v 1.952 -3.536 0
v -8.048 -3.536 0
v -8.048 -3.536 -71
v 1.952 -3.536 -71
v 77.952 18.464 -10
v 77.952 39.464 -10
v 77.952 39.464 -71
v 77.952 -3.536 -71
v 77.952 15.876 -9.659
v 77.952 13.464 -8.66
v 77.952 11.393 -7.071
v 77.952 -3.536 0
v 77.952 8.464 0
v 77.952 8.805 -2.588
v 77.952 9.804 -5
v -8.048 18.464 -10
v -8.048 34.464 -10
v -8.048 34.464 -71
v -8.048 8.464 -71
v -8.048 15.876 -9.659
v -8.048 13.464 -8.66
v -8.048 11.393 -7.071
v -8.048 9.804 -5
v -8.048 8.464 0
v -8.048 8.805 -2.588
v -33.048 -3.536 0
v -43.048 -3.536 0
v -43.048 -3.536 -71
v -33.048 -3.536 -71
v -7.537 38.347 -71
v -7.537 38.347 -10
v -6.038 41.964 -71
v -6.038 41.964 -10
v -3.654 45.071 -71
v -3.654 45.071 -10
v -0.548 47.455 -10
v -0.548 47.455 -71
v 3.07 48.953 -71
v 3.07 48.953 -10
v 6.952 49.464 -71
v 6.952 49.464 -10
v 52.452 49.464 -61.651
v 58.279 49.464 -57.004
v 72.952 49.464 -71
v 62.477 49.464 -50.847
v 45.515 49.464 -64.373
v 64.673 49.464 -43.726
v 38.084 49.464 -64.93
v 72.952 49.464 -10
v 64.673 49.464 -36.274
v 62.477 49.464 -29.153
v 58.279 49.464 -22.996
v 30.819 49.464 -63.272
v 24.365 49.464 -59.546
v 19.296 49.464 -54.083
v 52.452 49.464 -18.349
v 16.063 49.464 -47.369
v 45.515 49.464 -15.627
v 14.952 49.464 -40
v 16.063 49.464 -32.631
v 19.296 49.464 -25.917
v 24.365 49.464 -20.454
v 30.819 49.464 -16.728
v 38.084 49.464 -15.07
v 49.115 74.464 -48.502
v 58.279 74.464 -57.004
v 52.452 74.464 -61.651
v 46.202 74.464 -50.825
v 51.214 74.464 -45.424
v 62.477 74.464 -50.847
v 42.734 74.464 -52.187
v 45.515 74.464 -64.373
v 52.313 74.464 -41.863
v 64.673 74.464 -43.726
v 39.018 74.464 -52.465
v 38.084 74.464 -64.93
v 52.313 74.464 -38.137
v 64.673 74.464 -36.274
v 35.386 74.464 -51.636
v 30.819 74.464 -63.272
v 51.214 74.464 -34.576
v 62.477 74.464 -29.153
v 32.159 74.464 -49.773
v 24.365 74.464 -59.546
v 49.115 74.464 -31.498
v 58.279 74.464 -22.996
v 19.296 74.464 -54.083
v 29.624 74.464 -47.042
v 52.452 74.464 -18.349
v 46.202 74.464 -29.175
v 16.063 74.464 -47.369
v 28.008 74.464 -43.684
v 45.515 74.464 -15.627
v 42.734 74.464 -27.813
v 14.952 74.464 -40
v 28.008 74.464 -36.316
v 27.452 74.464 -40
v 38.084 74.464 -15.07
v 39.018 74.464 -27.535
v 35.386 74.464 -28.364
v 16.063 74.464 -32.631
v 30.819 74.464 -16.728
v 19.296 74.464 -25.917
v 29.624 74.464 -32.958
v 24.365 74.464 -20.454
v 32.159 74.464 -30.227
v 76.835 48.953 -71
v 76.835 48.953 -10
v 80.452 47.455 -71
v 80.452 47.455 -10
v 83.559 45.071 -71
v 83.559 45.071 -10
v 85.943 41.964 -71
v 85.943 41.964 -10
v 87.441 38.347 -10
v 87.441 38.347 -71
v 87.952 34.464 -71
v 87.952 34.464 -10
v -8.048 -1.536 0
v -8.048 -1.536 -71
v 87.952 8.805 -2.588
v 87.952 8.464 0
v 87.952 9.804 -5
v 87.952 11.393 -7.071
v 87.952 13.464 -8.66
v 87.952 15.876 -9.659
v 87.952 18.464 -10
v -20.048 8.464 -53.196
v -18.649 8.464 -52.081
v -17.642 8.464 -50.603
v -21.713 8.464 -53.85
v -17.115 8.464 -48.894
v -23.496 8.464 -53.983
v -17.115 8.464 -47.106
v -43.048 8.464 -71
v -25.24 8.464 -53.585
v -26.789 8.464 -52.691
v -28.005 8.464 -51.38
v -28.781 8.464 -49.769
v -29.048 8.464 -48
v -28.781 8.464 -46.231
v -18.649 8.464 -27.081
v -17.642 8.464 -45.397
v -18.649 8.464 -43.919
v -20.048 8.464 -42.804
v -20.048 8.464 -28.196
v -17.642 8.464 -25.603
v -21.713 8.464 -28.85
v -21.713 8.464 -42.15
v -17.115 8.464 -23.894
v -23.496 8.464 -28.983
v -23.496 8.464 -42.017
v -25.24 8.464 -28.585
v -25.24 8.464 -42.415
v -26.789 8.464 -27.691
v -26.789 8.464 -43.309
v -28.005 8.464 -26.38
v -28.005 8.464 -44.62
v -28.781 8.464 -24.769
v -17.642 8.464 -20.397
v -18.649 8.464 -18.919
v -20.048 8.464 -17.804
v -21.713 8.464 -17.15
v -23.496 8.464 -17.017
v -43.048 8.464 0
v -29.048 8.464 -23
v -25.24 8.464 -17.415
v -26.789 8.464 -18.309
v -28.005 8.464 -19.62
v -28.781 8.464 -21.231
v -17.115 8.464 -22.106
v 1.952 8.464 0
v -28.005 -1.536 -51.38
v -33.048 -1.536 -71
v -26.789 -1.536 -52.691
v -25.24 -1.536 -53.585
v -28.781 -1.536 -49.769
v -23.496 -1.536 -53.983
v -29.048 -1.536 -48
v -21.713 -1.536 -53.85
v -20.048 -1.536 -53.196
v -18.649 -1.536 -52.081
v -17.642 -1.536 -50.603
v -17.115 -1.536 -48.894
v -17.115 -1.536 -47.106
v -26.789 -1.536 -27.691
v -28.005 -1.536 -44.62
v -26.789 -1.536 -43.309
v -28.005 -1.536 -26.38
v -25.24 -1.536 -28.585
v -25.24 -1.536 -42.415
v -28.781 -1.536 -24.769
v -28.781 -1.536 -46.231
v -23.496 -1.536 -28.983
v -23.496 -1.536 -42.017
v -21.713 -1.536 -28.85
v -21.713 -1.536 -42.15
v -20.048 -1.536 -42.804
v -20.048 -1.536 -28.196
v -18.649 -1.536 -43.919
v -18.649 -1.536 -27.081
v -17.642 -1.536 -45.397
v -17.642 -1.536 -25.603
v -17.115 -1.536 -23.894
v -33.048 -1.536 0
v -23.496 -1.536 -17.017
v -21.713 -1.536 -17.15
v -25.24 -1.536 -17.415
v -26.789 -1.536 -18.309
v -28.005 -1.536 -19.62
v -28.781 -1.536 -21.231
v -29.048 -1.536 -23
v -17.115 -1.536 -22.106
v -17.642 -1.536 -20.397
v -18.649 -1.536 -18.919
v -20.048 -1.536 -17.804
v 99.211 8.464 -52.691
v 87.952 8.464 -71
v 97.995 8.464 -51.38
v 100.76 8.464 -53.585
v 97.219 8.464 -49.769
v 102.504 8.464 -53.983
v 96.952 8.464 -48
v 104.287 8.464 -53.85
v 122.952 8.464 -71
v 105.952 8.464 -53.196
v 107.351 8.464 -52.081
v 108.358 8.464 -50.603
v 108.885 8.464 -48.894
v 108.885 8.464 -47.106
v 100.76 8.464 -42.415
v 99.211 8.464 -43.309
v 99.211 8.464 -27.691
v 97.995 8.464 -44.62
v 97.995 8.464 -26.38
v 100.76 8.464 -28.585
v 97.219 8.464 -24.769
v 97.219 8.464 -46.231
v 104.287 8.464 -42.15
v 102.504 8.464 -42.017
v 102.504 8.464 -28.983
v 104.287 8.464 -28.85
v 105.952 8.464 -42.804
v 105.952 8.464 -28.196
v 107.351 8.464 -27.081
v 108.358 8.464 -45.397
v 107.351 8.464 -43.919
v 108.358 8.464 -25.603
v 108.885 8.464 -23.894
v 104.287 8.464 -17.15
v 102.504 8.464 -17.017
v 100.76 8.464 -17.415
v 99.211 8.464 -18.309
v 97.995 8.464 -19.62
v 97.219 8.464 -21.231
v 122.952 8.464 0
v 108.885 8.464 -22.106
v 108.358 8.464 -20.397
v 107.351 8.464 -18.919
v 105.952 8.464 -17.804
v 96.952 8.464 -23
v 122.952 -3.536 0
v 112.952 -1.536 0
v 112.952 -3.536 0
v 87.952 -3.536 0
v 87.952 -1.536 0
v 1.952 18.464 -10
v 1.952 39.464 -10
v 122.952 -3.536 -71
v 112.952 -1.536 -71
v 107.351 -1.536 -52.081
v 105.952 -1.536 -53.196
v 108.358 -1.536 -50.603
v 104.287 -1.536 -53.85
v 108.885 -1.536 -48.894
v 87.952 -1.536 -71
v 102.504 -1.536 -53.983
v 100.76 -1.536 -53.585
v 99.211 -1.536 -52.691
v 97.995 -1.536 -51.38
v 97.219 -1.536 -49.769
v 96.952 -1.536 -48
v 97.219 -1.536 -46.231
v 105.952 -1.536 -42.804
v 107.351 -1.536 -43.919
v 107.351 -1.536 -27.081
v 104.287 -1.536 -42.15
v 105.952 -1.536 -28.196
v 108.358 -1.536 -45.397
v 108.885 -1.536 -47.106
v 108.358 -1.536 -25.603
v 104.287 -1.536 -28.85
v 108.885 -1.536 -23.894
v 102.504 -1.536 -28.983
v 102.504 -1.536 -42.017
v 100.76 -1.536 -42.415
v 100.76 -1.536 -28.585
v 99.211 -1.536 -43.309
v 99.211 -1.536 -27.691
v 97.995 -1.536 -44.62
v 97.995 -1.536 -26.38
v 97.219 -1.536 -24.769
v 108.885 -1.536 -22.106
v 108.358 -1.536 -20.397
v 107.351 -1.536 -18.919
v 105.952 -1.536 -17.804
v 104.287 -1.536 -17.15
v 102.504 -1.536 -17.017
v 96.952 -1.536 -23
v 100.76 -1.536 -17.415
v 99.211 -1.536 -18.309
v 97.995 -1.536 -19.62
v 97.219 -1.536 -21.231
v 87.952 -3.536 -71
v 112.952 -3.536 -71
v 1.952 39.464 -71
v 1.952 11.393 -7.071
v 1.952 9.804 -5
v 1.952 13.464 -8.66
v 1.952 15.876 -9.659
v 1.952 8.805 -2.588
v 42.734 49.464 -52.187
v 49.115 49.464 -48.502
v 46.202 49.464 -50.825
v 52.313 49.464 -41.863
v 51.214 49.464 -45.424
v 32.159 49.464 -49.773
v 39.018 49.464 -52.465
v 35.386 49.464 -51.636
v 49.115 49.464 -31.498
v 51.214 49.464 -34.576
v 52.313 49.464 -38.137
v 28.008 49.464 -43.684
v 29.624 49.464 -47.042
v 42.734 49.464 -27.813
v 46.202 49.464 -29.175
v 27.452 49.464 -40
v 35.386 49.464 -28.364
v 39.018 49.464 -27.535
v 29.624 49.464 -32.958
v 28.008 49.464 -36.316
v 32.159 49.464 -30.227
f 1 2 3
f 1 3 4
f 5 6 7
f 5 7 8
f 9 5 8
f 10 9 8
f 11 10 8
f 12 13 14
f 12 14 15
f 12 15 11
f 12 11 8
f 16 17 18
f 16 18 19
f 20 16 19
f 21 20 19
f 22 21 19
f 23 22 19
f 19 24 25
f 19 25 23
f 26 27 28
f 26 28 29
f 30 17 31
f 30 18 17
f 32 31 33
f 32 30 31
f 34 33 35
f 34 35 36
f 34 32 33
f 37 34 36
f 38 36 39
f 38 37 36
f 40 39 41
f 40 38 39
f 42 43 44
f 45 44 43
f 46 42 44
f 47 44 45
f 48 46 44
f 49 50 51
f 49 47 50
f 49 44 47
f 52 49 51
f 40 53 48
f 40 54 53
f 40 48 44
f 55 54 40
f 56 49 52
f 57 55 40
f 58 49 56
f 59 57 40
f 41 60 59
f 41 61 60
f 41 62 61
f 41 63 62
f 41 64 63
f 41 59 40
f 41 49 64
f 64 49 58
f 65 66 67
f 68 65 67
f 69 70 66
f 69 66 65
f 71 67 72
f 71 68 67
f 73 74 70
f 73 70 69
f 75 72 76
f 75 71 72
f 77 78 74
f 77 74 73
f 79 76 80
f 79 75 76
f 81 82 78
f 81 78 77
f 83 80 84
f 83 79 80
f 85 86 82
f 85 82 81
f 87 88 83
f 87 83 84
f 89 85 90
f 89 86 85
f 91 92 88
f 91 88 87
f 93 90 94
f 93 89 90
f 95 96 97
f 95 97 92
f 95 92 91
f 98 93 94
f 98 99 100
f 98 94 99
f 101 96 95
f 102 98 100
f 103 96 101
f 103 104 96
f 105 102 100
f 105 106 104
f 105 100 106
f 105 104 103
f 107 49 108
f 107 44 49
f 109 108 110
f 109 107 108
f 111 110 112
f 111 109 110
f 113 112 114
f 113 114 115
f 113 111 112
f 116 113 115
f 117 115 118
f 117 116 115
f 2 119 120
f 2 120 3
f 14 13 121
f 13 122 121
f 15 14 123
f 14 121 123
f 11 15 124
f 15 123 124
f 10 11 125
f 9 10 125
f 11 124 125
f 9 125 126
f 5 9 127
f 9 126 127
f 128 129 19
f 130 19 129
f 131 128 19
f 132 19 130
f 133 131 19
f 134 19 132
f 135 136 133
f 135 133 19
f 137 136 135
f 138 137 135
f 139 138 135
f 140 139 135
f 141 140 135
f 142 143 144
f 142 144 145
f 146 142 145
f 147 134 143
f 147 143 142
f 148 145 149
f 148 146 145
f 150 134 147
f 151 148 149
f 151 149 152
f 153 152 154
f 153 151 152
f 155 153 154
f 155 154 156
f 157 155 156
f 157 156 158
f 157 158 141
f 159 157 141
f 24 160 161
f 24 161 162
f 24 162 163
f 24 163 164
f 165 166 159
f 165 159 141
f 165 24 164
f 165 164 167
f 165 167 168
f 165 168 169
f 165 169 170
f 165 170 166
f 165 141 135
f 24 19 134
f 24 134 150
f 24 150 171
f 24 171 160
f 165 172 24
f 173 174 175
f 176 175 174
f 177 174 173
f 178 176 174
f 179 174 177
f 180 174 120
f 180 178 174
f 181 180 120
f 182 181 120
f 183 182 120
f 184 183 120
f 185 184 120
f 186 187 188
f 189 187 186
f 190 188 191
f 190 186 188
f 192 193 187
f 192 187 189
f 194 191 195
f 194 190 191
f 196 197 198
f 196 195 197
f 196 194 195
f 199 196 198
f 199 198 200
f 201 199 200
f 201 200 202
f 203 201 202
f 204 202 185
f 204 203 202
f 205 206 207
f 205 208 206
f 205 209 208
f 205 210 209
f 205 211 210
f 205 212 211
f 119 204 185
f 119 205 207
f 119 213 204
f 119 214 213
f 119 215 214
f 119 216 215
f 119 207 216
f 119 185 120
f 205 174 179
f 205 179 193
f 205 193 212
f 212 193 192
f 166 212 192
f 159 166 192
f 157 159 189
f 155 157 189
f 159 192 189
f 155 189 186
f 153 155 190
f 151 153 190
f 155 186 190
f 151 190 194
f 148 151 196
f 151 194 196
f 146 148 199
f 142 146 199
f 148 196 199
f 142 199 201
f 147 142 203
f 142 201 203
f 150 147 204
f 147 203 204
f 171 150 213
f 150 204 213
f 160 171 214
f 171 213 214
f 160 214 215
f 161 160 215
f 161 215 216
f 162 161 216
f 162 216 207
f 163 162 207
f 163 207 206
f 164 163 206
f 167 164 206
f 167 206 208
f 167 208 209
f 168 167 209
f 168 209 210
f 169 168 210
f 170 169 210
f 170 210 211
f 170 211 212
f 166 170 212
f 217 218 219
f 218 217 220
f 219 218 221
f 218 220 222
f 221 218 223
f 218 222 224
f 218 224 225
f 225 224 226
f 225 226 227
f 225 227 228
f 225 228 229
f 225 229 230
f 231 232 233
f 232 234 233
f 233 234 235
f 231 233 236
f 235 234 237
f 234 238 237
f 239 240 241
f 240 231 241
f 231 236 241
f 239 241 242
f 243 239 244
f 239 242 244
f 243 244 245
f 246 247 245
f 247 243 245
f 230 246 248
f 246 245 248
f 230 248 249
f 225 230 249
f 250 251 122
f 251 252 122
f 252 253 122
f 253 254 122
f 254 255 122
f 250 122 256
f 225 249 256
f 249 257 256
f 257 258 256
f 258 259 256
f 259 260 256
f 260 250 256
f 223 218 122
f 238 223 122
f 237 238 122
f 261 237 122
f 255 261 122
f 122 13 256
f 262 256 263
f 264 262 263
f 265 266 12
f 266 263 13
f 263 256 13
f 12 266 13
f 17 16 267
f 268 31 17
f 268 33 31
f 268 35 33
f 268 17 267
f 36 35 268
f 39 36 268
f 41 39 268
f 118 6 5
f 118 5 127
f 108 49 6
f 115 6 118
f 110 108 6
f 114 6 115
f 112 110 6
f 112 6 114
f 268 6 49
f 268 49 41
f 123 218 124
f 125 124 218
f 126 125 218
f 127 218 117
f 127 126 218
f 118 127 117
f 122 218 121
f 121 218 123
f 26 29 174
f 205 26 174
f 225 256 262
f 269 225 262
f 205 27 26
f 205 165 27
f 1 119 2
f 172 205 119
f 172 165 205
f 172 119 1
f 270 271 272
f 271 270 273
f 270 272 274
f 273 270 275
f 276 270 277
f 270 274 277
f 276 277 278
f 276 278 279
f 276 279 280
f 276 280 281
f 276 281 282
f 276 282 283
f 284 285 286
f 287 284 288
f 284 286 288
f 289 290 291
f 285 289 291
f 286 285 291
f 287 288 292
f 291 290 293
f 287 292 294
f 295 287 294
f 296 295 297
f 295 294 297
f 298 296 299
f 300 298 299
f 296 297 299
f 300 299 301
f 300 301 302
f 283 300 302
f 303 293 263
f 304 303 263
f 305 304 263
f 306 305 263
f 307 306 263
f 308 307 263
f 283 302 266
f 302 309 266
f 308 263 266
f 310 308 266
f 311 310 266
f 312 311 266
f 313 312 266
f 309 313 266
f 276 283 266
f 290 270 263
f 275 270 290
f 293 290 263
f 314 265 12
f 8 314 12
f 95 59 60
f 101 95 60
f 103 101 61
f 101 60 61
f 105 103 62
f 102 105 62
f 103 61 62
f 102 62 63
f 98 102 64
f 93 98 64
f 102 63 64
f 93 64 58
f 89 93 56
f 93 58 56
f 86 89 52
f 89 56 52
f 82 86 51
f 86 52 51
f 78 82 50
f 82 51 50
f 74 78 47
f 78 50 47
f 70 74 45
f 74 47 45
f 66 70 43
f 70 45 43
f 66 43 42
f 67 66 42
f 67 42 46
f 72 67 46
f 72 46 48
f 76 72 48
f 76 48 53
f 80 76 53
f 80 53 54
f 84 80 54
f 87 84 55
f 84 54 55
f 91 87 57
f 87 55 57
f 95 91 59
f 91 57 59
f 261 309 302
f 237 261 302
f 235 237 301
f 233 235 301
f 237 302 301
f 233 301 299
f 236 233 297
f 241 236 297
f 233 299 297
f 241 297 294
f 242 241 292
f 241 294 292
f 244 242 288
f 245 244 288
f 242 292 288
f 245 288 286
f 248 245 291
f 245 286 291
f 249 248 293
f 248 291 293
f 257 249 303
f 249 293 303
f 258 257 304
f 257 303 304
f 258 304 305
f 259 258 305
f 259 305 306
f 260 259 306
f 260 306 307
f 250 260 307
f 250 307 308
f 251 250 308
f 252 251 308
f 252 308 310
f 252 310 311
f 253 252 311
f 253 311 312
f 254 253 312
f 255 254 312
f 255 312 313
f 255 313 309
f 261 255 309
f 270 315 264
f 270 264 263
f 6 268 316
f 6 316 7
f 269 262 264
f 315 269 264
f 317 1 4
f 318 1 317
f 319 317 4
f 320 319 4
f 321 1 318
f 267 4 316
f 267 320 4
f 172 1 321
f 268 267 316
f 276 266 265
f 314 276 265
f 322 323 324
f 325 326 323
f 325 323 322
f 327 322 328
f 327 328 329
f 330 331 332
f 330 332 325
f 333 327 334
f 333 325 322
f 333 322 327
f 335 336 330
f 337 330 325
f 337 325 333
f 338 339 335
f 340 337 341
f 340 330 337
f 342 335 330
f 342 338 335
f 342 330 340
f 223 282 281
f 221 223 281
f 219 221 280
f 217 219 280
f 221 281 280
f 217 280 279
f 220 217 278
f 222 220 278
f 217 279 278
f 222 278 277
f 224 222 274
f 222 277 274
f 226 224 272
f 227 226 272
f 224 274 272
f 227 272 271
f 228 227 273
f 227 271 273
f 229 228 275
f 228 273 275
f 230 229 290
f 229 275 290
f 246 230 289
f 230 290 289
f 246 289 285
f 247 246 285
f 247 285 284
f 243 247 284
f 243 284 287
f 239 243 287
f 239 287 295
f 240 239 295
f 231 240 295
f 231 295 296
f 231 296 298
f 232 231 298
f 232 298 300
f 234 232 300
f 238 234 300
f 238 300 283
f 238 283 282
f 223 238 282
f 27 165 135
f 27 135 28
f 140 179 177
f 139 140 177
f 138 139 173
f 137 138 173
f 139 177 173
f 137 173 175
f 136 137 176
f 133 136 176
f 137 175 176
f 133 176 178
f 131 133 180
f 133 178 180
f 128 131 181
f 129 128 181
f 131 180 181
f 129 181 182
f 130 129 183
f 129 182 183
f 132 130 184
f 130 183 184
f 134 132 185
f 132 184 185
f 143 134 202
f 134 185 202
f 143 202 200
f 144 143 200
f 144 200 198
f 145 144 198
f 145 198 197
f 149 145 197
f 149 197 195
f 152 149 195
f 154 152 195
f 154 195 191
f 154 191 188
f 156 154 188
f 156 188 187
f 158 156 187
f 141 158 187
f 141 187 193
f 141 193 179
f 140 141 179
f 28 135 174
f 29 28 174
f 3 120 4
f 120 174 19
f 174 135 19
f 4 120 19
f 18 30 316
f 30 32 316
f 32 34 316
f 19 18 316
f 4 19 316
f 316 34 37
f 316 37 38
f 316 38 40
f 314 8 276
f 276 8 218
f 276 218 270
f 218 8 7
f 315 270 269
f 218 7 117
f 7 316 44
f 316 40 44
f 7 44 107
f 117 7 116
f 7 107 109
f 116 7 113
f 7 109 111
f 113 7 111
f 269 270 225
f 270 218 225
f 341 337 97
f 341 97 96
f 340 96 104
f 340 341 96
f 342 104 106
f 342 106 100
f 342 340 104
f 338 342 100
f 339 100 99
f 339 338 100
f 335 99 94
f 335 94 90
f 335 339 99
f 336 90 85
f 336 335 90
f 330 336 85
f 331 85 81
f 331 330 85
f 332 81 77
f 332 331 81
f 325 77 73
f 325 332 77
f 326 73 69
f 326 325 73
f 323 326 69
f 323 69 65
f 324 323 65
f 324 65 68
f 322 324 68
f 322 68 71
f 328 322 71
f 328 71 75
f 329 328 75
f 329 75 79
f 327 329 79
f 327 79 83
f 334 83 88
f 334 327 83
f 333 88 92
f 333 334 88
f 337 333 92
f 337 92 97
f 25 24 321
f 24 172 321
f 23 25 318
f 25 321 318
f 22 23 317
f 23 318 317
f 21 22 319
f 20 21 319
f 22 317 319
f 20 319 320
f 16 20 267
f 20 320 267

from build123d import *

# Parameters (mm, degrees)
BOSS_EXTRUDE1_DEPTH    = 71
BOSS_EXTRUDE1_2_DEPTH  = 71
BOSS_EXTRUDE3_DEPTH    = 61
FILLET2_R              = 10
FILLET3_R              = 15
SKETCH6_R              = 25
SKETCH6_R_2            = 12.5
BOSS_EXTRUDE4_DEPTH    = 25
F_12_0MM_DOWEL_SLOT1_D = 12
F_12_0MM_DOWEL_SLOT2_D = 12


with BuildPart() as part:
    # Sketch2 → Boss-Extrude1 (new body)
    with BuildSketch(Plane.XY):
        Polygon((-43.047651623, -3.53558301), (-33.047651623, -3.53558301), (-33.047651623, -1.53558301), (-8.047651623, -1.53558301), (-8.047651623, -3.53558301), (1.952348377, -3.53558301), (1.952348377, 8.46441699), (-43.047651623, 8.46441699), align=None)
    extrude(amount=-BOSS_EXTRUDE1_DEPTH)



with BuildPart() as body_2:
    # Sketch2 → Boss-Extrude1 2 (new body)
    with BuildSketch(Plane.XY):
        Polygon((77.952348377, -3.53558301), (77.952348377, 8.46441699), (122.952348377, 8.46441699), (122.952348377, -3.53558301), (112.952348377, -3.53558301), (112.952348377, -1.53558301), (87.952348377, -1.53558301), (87.952348377, -3.53558301), align=None)
    extrude(amount=-BOSS_EXTRUDE1_2_DEPTH)


with BuildPart() as part_1:
    add(part.part)

    add(body_2.part)  # Boss-Extrude3 merges body 2
    # Sketch5 → Boss-Extrude3 (add)
    with BuildSketch(Plane.XY.offset(-10)):
        Polygon((1.952348377, 8.46441699), (1.952348377, 39.46441699), (77.952348377, 39.46441699), (77.952348377, 8.46441699), (87.952348377, 8.46441699), (87.952348377, 49.46441699), (-8.047651623, 49.46441699), (-8.047651623, 8.46441699), align=None)
    extrude(amount=-BOSS_EXTRUDE3_DEPTH)

    # Fillet2
    fillet2_edges = [part_1.edges().sort_by_distance(p)[0] for p in [
        (82.952348377, 8.46441699, -10),
        (-3.047651623, 8.46441699, -10),
    ]]
    fillet(fillet2_edges, radius=FILLET2_R - 0.0001)  # a hair under: the kernel refuses the full size

    # Fillet3
    fillet3_edges = [part_1.edges().sort_by_distance(p)[0] for p in [
        (-8.047651623, 49.46441699, -40.5),
        (87.952348377, 49.46441699, -40.5),
    ]]
    fillet(fillet3_edges, radius=FILLET3_R)

    # Sketch6 → Boss-Extrude4 (add)
    with BuildSketch(Plane(origin=(0, 49.46441699, 0), x_dir=(1, 0, 0), z_dir=(0, 1, 0))):
        with Locations(Location((39.952348377, 40, 0), (0, 0, 180))):
            Circle(SKETCH6_R)
        with Locations(Location((39.952348377, 40, 0), (0, 0, 180))):
            Circle(SKETCH6_R_2, mode=Mode.SUBTRACT)
    extrude(amount=BOSS_EXTRUDE4_DEPTH)

    # Ø12.0mm Dowel Slot1 (through all)
    with Locations(Plane(origin=(0, 8.46441699, 0), x_dir=(1, 0, 0), z_dir=(0, 1, 0))):
        with Locations((102.952348377, 48), (102.952348377, 23)):
            Hole(F_12_0MM_DOWEL_SLOT1_D / 2)

    # Ø12.0mm Dowel Slot2 (through all)
    with Locations(Plane(origin=(0, 8.46441699, 0), x_dir=(1, 0, 0), z_dir=(0, 1, 0))):
        with Locations((-23.047651623, 23), (-23.047651623, 48)):
            Hole(F_12_0MM_DOWEL_SLOT2_D / 2)


solid = part_1.part
